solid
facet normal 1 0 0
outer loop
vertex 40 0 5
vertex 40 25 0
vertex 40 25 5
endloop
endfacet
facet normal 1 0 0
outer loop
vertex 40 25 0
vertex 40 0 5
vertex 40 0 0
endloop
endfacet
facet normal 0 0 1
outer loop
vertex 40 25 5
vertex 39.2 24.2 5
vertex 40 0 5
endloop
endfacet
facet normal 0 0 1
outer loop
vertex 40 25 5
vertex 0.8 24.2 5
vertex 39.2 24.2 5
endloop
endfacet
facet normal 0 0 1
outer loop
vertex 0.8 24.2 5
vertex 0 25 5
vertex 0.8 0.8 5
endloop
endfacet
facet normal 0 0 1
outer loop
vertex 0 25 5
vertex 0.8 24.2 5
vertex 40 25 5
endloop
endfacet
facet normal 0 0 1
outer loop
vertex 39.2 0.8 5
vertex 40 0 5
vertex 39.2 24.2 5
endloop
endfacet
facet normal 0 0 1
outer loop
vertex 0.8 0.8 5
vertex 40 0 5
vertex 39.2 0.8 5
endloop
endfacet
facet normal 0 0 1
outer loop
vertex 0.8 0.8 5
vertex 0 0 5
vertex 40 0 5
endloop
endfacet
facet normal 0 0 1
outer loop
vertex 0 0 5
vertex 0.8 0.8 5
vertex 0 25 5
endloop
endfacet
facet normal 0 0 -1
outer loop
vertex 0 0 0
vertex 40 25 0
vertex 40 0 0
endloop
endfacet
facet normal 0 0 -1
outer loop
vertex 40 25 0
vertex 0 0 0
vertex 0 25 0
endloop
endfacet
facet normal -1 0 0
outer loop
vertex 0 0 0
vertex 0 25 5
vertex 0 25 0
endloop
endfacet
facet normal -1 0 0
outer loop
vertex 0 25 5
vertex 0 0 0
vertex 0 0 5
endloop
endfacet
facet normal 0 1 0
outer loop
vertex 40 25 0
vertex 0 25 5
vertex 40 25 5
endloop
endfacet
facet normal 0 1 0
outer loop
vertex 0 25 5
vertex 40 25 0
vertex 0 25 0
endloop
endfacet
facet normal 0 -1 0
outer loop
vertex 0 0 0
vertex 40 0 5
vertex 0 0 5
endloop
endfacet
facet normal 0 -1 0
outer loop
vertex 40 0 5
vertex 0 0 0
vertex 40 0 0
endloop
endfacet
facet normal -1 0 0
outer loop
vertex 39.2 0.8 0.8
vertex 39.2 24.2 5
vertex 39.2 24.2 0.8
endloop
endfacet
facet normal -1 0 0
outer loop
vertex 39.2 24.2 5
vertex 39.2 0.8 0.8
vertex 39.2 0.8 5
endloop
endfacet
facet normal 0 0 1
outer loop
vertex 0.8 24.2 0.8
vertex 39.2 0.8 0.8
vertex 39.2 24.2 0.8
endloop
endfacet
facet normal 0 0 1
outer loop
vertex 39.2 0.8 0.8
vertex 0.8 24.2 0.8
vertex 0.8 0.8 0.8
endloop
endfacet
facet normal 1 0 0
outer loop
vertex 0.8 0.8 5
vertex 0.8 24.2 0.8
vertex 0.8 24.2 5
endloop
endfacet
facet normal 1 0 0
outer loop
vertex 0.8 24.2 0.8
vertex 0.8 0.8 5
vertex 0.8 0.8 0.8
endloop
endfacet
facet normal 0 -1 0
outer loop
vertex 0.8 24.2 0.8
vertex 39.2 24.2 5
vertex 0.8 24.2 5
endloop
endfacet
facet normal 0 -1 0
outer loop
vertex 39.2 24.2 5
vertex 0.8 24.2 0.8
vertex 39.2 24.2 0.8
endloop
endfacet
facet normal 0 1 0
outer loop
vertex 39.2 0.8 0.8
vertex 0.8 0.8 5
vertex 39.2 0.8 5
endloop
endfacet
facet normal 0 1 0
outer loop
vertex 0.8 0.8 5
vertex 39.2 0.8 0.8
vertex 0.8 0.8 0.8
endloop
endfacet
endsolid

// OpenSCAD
thickness = 0.8;

difference() {
  cube([40, 25, 5]);
  
  translate([thickness, thickness, thickness])
    cube([40 - 2 * thickness, 25 - 2 * thickness, 6]);
}
